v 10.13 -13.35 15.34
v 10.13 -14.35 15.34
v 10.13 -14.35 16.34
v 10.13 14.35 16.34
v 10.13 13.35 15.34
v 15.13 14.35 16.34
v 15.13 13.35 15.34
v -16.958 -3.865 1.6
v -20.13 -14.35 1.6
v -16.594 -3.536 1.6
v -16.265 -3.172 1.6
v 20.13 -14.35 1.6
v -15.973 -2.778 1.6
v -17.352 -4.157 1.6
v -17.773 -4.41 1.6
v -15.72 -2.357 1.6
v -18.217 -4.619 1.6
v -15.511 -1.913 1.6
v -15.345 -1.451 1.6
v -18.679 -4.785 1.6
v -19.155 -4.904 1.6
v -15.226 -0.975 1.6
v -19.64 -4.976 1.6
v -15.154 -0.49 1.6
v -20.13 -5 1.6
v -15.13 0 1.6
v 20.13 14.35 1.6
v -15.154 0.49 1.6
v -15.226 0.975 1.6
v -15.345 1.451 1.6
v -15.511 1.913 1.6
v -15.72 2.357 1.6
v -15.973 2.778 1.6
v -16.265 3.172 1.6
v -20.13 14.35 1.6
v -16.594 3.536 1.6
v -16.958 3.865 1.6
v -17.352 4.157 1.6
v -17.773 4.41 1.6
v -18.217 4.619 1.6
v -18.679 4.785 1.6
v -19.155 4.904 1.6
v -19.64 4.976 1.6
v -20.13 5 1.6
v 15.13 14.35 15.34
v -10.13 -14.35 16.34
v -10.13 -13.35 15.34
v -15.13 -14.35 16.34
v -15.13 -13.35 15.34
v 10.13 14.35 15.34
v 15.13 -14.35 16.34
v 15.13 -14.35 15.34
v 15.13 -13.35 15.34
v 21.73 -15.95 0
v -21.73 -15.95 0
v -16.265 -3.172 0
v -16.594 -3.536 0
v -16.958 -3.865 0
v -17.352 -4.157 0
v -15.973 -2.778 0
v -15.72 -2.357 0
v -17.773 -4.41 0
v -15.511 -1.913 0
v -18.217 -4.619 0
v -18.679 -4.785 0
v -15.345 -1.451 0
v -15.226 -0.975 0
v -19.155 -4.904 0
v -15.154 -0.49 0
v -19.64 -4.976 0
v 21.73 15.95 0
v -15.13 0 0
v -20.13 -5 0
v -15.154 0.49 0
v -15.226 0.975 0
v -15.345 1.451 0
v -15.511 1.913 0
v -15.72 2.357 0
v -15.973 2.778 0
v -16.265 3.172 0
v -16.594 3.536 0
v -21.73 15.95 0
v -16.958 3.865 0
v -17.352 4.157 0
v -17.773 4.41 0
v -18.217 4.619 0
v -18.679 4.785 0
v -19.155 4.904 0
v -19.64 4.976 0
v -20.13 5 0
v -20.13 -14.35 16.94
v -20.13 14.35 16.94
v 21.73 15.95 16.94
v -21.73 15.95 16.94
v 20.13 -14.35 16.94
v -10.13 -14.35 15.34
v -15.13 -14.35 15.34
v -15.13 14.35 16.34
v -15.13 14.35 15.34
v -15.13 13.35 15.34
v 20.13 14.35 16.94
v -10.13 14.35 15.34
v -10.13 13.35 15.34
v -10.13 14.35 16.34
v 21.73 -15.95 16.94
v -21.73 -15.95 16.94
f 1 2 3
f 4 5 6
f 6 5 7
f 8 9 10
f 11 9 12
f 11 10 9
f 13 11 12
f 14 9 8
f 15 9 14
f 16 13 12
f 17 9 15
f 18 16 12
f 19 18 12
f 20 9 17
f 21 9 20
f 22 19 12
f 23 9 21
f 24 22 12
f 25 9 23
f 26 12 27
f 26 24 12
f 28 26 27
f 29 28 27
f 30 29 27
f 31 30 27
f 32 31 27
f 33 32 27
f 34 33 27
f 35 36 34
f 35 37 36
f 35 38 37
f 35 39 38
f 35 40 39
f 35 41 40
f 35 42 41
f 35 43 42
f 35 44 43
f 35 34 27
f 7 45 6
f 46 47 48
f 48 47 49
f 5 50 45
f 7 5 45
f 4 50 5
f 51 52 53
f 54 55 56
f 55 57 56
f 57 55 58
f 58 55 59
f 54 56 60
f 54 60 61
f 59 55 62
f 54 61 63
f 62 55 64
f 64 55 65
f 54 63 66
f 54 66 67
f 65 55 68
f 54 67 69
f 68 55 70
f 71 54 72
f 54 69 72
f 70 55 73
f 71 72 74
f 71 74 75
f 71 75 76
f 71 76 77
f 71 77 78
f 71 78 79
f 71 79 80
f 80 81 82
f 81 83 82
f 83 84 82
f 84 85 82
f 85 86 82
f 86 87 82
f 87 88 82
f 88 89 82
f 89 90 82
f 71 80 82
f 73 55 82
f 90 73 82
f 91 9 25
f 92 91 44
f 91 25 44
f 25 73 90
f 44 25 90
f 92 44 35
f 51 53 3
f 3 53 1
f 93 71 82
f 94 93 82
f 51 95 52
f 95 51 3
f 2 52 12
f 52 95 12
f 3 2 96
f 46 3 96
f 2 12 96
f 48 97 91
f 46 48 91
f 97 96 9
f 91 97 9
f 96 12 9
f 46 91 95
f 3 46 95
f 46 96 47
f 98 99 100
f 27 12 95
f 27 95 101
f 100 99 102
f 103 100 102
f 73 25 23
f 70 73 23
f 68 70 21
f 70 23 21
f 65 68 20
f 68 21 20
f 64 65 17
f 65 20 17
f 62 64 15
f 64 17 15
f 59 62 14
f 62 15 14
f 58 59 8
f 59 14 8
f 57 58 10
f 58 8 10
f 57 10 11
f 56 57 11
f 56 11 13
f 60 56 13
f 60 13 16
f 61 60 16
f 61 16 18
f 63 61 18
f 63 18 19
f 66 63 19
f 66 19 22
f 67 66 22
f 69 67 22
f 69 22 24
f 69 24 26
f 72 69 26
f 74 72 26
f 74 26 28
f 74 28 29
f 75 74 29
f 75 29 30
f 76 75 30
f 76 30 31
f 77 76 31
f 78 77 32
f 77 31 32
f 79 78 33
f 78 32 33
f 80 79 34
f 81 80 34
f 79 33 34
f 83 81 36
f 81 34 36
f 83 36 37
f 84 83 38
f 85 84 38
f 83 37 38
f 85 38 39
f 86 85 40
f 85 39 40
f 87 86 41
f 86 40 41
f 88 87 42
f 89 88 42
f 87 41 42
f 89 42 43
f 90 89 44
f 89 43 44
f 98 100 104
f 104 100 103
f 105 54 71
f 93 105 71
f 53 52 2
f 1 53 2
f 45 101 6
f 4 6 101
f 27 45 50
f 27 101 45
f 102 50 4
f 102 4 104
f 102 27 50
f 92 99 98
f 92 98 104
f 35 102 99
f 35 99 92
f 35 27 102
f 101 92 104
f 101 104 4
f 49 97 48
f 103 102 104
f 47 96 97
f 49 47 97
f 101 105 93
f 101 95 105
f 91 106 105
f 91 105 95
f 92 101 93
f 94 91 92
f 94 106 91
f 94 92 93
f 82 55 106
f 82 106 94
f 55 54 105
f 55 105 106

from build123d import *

# Parameters (mm, degrees)
SKETCH2_W           = 31.9
SKETCH2_H           = 43.46
BOSS_EXTRUDE1_DEPTH = 16.94
SHELL1_T            = -1.6
SKETCH3_W           = 5
SKETCH3_H           = 1
BOSS_EXTRUDE2_DEPTH = 1
SKETCH4_W           = 5
SKETCH4_H           = 1
BOSS_EXTRUDE3_DEPTH = 1
CHAMFER1_SIZE       = 1
CUT_EXTRUDE1_DEPTH  = 32.014690068


with BuildPart() as part:
    # Sketch2 → Boss-Extrude1 (new body)
    with BuildSketch(Plane(origin=(0, 0, 0), x_dir=(0, 1, 0), z_dir=(0, 0, 1))):
        Rectangle(SKETCH2_W, SKETCH2_H)
    extrude(amount=BOSS_EXTRUDE1_DEPTH)

    # Shell1
    shell1_openings = [part.faces().sort_by_distance(p)[0] for p in [
        (0, 0, 16.94),
    ]]
    offset(amount=SHELL1_T, openings=shell1_openings, kind=Kind.INTERSECTION)

    # Sketch3 → Boss-Extrude2 (add)
    with BuildSketch(Plane(origin=(0, -14.35, 0), x_dir=(-1, 0, 0), z_dir=(0, 1, 0))):
        with Locations((-12.63, 15.84)):
            Rectangle(SKETCH3_W, SKETCH3_H)
        with Locations((12.63, 15.84)):
            Rectangle(SKETCH3_W, SKETCH3_H)
    extrude(amount=BOSS_EXTRUDE2_DEPTH)

    # Sketch4 → Boss-Extrude3 (add)
    with BuildSketch(Plane.XZ.offset(-14.35)):
        with Locations((-12.63, 15.84)):
            Rectangle(SKETCH4_W, SKETCH4_H)
        with Locations((12.63, 15.84)):
            Rectangle(SKETCH4_W, SKETCH4_H)
    extrude(amount=BOSS_EXTRUDE3_DEPTH)

    # Chamfer1
    chamfer1_edges = [part.edges().sort_by_distance(p)[0] for p in [
        (-12.63, -13.35, 16.34),
        (12.63, -13.35, 16.34),
        (-12.63, 13.35, 16.34),
        (12.63, 13.35, 16.34),
    ]]
    chamfer(chamfer1_edges, length=CHAMFER1_SIZE - 0.0001)  # a hair under: the kernel refuses the full size

    # Sketch5 → Cut-Extrude1 (cut, through all)
    with BuildSketch(Plane.XY.offset(1.6)):
        with BuildLine():
            Line((-20.13, 5), (-20.13, -5))
            ThreePointArc((-20.13, -5), (-15.13, 0), (-20.13, 5))
        make_face()
    extrude(amount=-CUT_EXTRUDE1_DEPTH, mode=Mode.SUBTRACT)


solid = part.part
